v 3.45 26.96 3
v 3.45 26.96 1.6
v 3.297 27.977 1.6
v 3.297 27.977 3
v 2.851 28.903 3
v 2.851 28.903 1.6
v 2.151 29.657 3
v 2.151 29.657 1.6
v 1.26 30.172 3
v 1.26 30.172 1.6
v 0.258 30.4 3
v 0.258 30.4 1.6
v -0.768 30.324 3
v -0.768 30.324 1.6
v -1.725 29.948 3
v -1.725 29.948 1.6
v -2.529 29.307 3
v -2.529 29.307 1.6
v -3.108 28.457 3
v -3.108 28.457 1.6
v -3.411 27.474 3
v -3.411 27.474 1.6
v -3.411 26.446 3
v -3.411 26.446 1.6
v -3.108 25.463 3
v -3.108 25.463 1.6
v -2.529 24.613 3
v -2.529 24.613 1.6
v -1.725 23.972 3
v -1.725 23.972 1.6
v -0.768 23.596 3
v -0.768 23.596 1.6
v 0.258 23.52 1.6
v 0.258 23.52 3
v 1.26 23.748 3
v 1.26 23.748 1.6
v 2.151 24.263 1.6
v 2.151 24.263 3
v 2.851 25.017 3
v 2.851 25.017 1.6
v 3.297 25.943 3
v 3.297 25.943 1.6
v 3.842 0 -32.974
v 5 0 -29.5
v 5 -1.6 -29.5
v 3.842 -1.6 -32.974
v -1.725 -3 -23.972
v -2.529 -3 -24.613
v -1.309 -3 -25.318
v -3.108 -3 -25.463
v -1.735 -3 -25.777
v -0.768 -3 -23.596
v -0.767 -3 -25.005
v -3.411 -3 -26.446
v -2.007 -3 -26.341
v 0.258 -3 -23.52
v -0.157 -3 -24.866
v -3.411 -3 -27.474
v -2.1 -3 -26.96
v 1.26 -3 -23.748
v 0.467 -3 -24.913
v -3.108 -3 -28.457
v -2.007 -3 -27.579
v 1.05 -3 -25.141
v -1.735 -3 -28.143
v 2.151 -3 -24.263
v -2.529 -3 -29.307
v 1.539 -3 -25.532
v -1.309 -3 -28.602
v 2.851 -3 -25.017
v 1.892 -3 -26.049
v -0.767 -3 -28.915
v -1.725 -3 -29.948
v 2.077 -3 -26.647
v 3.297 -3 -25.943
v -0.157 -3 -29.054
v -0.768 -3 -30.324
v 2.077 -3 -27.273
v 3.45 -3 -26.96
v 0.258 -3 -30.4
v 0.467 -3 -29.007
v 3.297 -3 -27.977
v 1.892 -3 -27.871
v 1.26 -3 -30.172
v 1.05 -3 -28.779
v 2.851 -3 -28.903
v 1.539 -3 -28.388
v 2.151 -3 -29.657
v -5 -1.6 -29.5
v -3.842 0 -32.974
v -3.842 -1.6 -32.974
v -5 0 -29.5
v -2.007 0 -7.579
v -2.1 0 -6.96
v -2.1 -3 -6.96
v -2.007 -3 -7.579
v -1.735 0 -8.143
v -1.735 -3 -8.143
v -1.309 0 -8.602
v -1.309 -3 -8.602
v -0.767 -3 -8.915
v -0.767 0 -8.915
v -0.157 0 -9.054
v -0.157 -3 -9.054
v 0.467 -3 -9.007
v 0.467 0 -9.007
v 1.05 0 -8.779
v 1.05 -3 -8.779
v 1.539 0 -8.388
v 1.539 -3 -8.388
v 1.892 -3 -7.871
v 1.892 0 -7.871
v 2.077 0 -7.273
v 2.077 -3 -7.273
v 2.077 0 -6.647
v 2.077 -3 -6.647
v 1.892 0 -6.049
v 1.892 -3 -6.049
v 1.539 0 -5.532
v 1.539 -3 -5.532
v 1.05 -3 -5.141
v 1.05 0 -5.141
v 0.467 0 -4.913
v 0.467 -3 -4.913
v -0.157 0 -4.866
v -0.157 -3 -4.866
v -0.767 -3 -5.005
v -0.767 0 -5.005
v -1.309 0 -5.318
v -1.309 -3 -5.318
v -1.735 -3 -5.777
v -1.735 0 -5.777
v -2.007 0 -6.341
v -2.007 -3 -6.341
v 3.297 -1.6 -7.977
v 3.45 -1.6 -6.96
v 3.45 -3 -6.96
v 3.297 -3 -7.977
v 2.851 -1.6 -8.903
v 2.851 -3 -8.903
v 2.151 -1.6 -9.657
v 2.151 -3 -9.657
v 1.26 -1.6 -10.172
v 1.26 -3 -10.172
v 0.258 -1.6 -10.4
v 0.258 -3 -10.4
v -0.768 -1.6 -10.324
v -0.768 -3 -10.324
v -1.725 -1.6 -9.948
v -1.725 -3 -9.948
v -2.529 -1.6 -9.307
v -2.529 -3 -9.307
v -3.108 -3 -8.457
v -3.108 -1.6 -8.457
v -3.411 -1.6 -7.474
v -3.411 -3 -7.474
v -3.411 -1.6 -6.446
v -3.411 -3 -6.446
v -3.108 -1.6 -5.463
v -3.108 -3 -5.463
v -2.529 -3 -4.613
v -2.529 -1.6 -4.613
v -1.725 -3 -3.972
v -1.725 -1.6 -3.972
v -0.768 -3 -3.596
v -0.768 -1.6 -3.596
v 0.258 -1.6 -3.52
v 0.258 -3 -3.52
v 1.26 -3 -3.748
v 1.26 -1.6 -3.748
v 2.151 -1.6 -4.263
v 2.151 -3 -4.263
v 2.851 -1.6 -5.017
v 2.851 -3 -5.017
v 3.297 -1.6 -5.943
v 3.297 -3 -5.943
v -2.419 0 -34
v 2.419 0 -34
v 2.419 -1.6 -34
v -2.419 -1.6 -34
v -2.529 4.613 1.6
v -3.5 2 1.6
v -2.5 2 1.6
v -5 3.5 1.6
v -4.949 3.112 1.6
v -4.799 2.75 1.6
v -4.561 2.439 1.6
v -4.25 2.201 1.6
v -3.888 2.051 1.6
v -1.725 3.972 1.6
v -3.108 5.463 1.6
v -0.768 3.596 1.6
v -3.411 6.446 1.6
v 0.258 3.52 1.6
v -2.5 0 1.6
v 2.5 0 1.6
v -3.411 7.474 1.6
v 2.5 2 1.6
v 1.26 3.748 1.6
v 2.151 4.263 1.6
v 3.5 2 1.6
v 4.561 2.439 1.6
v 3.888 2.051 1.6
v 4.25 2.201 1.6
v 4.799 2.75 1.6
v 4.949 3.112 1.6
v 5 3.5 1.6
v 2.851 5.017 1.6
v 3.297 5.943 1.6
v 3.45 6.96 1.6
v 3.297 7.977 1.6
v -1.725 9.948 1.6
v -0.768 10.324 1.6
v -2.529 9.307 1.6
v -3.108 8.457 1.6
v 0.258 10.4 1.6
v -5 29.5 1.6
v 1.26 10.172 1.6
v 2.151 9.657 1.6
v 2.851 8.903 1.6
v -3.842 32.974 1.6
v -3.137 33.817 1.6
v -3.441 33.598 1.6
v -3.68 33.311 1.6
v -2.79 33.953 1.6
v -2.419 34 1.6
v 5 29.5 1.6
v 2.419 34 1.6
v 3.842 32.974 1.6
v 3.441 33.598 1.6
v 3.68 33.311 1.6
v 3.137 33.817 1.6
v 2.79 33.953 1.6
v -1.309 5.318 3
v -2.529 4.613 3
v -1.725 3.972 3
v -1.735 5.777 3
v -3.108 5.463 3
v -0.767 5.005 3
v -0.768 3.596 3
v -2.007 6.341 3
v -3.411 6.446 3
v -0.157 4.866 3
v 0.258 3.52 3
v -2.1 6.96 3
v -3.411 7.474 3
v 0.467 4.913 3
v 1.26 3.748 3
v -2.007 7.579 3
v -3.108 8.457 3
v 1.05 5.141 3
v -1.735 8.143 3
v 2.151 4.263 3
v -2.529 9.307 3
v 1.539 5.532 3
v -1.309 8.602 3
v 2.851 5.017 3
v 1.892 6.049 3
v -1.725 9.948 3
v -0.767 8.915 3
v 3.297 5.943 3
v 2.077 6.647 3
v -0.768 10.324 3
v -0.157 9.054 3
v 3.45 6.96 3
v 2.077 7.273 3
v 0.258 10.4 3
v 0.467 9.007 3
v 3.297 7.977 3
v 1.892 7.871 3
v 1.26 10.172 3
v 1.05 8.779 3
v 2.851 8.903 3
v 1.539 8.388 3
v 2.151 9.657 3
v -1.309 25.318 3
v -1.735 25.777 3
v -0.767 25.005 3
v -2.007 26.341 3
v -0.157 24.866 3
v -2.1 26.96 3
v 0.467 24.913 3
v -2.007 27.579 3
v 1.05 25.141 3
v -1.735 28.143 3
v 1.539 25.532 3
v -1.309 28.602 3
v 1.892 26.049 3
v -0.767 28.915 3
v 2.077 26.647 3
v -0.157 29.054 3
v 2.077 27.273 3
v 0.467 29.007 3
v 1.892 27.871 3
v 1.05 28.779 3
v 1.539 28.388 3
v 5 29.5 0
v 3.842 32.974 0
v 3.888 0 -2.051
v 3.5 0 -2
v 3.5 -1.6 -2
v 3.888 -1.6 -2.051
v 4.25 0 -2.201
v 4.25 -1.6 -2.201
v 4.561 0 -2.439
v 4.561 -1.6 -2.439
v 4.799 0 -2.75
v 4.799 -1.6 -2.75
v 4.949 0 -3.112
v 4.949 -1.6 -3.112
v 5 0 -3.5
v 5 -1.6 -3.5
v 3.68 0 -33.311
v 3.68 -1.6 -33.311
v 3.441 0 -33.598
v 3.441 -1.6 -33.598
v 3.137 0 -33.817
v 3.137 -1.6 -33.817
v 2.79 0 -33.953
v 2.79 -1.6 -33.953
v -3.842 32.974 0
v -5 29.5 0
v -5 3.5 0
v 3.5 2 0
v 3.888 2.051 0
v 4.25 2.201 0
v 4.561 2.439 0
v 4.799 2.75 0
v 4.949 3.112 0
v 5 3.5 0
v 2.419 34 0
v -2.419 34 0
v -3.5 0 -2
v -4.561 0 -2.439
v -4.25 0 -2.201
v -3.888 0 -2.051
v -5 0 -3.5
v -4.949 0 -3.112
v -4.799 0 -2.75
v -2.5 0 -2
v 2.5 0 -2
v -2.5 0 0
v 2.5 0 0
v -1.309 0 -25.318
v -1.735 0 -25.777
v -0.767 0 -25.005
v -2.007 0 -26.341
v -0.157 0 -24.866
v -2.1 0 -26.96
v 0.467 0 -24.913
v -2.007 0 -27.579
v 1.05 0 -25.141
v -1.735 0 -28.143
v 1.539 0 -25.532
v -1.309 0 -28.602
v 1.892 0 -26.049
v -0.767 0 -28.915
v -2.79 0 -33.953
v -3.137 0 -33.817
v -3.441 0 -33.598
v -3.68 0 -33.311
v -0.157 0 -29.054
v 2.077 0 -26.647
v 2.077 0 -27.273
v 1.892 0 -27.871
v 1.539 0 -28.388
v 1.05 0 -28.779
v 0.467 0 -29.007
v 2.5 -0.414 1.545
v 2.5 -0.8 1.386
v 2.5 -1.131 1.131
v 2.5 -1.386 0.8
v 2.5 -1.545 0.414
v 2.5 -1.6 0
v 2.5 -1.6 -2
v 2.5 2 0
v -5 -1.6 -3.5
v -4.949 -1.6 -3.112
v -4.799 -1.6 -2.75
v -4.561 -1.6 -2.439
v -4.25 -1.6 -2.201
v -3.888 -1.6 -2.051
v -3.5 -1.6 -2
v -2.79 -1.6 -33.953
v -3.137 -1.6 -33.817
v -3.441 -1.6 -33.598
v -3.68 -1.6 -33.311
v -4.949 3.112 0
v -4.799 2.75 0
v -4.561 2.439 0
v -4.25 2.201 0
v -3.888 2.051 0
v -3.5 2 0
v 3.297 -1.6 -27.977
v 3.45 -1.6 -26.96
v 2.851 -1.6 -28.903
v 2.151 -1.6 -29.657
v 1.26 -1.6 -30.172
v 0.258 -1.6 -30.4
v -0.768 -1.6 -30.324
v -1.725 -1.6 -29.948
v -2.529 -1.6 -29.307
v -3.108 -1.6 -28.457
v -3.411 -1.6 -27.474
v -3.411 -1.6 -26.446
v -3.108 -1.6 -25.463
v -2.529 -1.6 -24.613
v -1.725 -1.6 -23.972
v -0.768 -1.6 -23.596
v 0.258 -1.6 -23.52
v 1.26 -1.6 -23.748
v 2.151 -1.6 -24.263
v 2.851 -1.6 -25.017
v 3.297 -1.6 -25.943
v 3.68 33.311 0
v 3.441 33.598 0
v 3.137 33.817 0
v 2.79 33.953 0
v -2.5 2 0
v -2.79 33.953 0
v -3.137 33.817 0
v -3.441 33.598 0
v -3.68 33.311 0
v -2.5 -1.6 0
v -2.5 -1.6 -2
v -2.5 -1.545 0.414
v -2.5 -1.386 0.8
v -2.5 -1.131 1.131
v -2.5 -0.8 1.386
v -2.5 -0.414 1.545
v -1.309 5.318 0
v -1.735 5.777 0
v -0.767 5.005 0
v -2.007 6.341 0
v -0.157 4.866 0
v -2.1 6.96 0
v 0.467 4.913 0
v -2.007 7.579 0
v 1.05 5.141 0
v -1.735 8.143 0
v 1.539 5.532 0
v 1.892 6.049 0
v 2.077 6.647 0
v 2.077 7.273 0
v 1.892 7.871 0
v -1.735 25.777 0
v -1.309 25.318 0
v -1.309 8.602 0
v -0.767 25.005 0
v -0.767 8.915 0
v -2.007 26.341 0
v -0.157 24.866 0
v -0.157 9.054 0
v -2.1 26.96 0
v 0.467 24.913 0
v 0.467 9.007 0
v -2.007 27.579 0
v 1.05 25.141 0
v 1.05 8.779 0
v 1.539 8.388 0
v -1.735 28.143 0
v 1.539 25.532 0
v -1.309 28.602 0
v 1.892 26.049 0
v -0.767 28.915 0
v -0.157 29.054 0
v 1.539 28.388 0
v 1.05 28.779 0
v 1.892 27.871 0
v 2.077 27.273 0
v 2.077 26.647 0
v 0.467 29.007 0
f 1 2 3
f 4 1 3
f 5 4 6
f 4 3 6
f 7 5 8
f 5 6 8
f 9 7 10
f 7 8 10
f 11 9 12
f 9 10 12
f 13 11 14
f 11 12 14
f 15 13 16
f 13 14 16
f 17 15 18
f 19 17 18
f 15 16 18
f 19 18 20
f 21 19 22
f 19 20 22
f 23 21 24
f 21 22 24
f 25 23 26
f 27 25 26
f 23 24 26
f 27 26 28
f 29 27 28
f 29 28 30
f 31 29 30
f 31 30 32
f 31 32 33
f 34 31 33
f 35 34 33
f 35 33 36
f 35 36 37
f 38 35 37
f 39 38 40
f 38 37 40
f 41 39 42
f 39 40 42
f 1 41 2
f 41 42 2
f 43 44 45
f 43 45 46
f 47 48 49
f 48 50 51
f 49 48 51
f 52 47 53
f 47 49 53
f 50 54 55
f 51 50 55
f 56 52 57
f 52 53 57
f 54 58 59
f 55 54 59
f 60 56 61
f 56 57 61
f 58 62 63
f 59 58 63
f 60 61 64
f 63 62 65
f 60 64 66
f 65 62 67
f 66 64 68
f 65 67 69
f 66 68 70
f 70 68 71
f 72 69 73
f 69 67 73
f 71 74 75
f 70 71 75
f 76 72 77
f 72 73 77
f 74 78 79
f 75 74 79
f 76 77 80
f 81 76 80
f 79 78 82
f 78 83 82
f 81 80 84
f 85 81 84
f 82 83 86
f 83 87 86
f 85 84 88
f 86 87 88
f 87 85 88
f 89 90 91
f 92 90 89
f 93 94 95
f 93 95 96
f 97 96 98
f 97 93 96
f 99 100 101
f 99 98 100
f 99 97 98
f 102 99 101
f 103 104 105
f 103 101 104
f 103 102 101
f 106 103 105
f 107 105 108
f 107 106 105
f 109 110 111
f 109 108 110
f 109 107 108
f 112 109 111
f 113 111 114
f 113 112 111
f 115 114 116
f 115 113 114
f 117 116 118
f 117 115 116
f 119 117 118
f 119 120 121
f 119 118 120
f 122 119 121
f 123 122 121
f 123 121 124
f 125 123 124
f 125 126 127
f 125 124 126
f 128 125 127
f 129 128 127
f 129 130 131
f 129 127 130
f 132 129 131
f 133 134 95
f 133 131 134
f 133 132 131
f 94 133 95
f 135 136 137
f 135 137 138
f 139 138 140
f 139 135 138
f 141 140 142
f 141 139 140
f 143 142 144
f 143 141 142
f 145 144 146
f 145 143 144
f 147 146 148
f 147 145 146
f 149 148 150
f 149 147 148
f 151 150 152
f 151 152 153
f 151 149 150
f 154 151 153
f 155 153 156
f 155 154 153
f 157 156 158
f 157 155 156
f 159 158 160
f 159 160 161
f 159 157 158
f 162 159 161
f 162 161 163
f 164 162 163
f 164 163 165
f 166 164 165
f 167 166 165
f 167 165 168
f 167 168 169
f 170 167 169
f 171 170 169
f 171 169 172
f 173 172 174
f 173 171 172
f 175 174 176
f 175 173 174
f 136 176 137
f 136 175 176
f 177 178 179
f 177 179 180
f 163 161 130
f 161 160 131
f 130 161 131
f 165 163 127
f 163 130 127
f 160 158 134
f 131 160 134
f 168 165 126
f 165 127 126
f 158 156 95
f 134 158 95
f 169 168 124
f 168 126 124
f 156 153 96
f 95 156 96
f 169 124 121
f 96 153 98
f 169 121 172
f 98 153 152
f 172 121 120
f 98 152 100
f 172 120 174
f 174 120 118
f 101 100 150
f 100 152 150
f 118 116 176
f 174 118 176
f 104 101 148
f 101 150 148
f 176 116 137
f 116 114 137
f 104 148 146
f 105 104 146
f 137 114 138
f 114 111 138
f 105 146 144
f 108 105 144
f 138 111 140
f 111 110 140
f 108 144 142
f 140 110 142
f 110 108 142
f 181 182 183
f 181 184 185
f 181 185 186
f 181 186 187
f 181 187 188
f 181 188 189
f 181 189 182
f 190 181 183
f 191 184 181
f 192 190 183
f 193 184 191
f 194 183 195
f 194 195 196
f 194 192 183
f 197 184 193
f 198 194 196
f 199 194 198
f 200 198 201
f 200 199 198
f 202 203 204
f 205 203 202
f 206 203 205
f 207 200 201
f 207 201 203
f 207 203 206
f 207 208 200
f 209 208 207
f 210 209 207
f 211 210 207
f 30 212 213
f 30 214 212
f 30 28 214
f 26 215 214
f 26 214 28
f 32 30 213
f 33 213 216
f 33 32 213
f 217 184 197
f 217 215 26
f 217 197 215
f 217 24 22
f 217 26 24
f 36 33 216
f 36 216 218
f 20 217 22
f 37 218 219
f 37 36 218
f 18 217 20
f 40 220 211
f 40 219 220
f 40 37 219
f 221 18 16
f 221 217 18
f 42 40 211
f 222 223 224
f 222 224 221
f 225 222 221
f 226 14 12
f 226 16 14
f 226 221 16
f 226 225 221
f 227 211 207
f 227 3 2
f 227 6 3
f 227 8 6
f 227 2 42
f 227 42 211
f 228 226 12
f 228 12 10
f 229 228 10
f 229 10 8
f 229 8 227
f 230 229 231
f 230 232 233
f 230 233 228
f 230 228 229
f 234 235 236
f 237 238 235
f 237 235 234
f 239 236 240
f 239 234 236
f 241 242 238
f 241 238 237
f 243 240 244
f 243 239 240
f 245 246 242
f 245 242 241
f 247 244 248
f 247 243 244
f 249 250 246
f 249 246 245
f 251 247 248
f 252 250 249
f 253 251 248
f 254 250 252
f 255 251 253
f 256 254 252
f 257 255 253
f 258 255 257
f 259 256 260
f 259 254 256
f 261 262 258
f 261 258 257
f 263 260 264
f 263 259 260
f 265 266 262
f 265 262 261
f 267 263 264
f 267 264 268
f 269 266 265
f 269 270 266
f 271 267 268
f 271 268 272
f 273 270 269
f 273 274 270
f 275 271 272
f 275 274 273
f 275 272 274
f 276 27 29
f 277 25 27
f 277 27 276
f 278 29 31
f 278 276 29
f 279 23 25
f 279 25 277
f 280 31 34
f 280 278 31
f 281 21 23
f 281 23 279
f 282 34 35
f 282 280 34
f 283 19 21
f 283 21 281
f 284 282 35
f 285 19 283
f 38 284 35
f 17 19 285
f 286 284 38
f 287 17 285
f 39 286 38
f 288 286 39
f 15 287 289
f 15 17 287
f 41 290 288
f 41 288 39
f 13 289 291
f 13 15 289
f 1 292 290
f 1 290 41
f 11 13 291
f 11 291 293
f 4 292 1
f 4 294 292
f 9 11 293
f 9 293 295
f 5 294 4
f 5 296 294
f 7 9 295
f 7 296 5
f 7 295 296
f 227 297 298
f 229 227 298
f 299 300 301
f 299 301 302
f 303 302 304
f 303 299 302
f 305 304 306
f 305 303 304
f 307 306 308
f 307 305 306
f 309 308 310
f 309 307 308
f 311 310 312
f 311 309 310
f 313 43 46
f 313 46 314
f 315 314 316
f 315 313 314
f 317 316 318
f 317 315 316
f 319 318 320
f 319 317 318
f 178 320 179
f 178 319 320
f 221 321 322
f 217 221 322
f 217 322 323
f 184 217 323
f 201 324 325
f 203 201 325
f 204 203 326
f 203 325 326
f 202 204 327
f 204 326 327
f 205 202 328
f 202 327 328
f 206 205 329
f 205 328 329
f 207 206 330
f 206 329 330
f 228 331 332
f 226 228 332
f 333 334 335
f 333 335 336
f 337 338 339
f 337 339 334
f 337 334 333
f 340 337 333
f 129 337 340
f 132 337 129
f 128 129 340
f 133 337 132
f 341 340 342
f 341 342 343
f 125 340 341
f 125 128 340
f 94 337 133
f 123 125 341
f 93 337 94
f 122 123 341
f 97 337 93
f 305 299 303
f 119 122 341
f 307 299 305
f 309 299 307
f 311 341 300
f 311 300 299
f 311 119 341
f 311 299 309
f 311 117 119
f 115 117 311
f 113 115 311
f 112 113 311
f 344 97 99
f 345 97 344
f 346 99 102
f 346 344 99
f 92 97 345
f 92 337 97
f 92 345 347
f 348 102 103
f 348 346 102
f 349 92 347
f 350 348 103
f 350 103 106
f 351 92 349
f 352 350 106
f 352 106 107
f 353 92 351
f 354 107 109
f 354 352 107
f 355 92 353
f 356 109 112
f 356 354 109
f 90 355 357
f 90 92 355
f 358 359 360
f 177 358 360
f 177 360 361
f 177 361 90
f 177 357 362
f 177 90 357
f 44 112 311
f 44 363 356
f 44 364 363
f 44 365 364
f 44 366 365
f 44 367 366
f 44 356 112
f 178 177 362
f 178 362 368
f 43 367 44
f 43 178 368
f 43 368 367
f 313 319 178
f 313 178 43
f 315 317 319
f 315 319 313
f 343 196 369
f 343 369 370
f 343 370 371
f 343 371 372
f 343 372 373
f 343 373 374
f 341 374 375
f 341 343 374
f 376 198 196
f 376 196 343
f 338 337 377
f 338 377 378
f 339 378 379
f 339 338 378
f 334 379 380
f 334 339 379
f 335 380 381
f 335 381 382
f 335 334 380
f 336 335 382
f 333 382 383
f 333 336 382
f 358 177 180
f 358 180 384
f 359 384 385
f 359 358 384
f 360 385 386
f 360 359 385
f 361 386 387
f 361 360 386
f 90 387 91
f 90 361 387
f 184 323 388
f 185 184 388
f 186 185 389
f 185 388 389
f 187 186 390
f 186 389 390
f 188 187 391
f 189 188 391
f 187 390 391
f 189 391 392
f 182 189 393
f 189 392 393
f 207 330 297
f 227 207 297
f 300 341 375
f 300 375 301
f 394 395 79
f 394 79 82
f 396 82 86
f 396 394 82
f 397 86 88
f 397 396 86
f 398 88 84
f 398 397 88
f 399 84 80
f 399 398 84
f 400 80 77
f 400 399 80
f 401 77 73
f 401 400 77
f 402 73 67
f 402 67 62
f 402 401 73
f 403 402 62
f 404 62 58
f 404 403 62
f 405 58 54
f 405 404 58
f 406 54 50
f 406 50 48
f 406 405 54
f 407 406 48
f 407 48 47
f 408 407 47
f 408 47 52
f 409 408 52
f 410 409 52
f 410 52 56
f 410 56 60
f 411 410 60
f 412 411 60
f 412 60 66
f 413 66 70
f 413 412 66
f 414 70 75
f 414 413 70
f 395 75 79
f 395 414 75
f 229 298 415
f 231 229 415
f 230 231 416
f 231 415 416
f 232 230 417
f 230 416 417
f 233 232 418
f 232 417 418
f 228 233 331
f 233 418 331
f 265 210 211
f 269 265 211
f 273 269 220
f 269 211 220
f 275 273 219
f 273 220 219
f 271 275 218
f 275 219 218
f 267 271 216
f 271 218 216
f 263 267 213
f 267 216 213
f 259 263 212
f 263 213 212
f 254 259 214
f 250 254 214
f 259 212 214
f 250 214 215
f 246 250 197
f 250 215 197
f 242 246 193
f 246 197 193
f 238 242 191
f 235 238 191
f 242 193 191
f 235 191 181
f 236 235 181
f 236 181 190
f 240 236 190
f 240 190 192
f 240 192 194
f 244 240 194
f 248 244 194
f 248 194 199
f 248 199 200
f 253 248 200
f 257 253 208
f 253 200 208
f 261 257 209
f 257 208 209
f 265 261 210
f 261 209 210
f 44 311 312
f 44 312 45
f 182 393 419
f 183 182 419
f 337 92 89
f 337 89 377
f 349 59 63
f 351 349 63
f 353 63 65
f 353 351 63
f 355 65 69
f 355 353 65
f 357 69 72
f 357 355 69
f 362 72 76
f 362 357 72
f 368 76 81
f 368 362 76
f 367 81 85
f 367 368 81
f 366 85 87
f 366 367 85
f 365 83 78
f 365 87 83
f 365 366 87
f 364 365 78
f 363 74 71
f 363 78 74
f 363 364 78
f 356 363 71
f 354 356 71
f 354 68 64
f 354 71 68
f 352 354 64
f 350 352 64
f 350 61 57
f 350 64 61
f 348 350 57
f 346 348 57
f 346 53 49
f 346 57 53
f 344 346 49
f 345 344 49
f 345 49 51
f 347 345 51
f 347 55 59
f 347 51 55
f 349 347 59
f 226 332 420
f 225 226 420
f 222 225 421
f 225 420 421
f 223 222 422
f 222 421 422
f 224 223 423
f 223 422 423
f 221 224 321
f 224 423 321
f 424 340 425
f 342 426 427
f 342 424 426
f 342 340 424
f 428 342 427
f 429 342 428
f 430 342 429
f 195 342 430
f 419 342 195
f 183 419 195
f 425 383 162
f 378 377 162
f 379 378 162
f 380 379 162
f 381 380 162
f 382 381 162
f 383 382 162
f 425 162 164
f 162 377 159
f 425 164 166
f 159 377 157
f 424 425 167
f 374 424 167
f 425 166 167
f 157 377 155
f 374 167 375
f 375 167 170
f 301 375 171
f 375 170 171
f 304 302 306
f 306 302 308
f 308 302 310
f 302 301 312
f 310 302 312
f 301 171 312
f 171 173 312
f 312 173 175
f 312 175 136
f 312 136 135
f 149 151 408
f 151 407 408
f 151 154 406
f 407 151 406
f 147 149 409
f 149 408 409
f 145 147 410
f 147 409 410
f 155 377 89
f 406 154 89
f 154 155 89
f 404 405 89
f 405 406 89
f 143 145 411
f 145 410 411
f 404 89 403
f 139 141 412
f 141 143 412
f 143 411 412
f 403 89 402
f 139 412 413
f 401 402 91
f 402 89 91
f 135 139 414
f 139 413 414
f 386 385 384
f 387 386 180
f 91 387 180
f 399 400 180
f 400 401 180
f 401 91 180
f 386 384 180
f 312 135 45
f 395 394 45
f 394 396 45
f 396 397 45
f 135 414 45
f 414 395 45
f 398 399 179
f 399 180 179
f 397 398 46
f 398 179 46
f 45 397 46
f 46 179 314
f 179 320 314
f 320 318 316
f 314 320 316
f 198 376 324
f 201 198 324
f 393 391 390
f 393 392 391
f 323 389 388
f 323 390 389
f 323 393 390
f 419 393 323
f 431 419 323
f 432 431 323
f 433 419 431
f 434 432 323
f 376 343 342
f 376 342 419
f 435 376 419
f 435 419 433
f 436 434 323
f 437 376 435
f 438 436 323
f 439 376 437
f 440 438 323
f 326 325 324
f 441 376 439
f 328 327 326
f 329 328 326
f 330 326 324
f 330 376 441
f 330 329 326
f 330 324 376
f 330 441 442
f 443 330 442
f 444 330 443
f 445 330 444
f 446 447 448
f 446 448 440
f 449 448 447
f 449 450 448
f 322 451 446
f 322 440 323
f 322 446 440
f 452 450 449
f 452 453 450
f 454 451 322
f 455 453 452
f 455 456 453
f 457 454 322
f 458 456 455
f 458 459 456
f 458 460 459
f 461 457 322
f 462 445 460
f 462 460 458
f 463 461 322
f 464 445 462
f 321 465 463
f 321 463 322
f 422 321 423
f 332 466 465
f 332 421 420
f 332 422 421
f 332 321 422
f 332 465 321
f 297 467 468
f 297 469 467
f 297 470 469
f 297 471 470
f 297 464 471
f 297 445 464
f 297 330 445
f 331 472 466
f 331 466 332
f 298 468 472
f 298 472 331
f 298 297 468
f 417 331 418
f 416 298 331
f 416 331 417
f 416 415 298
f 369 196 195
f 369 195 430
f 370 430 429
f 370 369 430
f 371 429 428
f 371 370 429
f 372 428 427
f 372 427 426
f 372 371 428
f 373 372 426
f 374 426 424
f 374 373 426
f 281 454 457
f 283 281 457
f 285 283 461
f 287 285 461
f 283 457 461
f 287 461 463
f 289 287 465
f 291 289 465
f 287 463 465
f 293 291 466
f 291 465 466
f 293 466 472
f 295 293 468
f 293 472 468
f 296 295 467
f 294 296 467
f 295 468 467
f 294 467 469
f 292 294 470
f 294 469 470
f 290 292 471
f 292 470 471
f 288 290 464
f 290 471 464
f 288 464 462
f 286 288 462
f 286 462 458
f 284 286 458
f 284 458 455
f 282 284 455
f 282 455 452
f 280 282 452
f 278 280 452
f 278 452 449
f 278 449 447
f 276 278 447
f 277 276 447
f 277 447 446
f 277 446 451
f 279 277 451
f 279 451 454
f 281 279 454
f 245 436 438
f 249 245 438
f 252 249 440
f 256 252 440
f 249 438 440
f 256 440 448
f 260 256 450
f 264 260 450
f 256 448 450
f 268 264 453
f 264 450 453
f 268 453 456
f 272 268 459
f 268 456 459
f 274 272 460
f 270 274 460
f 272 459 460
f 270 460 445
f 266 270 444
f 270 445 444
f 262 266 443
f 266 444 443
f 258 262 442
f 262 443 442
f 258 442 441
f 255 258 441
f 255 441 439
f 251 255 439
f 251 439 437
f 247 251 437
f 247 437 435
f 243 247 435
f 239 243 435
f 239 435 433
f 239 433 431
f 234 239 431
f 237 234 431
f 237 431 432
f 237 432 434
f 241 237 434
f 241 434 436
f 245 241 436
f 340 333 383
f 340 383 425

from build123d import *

# Parameters (mm, degrees)
BOSS_EXTRUDE1_DEPTH   = 1.6
SKETCH2_R             = 3.45
BOSS_EXTRUDE2_DEPTH   = 1.4
M5X0_8_TAPPED_HOLE1_D = 4.2
BOSS_EXTRUDE3_DEPTH   = 5


with BuildPart() as part:
    # Sketch1 → Boss-Extrude1 (new body)
    with BuildSketch(Plane.XY):
        with BuildLine():
            Line((-3.5, 2), (-2.5, 2))
            Line((-2.5, 2), (-2.5, 0))
            Line((-2.5, 0), (2.5, 0))
            Line((2.5, 0), (2.5, 2))
            Line((2.5, 2), (3.5, 2))
            ThreePointArc((3.5, 2), (4.560660172, 2.439339828), (5, 3.5))
            Line((5, 3.5), (5, 29.5))
            Line((5, 29.5), (3.841886117, 32.974341649))
            ThreePointArc((3.841886117, 32.974341649), (3.295926597, 33.716863278), (2.41886117, 34))
            Line((2.41886117, 34), (-2.41886117, 34))
            ThreePointArc((-2.41886117, 34), (-3.295926597, 33.716863278), (-3.841886117, 32.974341649))
            Line((-3.841886117, 32.974341649), (-5, 29.5))
            Line((-5, 29.5), (-5, 3.5))
            ThreePointArc((-5, 3.5), (-4.560660172, 2.439339828), (-3.5, 2))
        make_face()
    boss_extrude1 = extrude(amount=BOSS_EXTRUDE1_DEPTH)

    # Sketch2 → Boss-Extrude2 (add)
    with BuildSketch(Plane.XY.offset(1.6)):
        with Locations((0, 6.96)):
            Circle(SKETCH2_R)
        with Locations((0, 26.96)):
            Circle(SKETCH2_R)
    boss_extrude2 = extrude(amount=BOSS_EXTRUDE2_DEPTH)

    # M5x0.8 Tapped Hole1 (through all)
    with Locations(Plane.XY.offset(3)):
        with Locations((0, 26.96), (0, 6.96)):
            m5x0_8_tapped_hole1 = Hole(M5X0_8_TAPPED_HOLE1_D / 2)

    # Sketch5 → Boss-Extrude3 (add)
    with BuildSketch(Plane(origin=(2.5, 0, 0), x_dir=(0, 0, -1), z_dir=(1, 0, 0))):
        with BuildLine():
            Line((0, 0), (-1.6, 0))
            ThreePointArc((-1.6, 0), (-1.13137085, -1.13137085), (0, -1.6))
            Line((0, -1.6), (0, 0))
        make_face()
    extrude(amount=-BOSS_EXTRUDE3_DEPTH)

    # Mirror4: Boss-Extrude1, Boss-Extrude2, M5x0.8 Tapped Hole1 across plane
    add(boss_extrude1.mirror(Plane(origin=(0, 0, 0), x_dir=(0, -0.707106781, 0.707106781), z_dir=(0, -0.707106781, -0.707106781))))
    add(boss_extrude2.mirror(Plane(origin=(0, 0, 0), x_dir=(0, -0.707106781, 0.707106781), z_dir=(0, -0.707106781, -0.707106781))))
    add(m5x0_8_tapped_hole1.mirror(Plane(origin=(0, 0, 0), x_dir=(0, -0.707106781, 0.707106781), z_dir=(0, -0.707106781, -0.707106781))), mode=Mode.SUBTRACT)


solid = part.part
